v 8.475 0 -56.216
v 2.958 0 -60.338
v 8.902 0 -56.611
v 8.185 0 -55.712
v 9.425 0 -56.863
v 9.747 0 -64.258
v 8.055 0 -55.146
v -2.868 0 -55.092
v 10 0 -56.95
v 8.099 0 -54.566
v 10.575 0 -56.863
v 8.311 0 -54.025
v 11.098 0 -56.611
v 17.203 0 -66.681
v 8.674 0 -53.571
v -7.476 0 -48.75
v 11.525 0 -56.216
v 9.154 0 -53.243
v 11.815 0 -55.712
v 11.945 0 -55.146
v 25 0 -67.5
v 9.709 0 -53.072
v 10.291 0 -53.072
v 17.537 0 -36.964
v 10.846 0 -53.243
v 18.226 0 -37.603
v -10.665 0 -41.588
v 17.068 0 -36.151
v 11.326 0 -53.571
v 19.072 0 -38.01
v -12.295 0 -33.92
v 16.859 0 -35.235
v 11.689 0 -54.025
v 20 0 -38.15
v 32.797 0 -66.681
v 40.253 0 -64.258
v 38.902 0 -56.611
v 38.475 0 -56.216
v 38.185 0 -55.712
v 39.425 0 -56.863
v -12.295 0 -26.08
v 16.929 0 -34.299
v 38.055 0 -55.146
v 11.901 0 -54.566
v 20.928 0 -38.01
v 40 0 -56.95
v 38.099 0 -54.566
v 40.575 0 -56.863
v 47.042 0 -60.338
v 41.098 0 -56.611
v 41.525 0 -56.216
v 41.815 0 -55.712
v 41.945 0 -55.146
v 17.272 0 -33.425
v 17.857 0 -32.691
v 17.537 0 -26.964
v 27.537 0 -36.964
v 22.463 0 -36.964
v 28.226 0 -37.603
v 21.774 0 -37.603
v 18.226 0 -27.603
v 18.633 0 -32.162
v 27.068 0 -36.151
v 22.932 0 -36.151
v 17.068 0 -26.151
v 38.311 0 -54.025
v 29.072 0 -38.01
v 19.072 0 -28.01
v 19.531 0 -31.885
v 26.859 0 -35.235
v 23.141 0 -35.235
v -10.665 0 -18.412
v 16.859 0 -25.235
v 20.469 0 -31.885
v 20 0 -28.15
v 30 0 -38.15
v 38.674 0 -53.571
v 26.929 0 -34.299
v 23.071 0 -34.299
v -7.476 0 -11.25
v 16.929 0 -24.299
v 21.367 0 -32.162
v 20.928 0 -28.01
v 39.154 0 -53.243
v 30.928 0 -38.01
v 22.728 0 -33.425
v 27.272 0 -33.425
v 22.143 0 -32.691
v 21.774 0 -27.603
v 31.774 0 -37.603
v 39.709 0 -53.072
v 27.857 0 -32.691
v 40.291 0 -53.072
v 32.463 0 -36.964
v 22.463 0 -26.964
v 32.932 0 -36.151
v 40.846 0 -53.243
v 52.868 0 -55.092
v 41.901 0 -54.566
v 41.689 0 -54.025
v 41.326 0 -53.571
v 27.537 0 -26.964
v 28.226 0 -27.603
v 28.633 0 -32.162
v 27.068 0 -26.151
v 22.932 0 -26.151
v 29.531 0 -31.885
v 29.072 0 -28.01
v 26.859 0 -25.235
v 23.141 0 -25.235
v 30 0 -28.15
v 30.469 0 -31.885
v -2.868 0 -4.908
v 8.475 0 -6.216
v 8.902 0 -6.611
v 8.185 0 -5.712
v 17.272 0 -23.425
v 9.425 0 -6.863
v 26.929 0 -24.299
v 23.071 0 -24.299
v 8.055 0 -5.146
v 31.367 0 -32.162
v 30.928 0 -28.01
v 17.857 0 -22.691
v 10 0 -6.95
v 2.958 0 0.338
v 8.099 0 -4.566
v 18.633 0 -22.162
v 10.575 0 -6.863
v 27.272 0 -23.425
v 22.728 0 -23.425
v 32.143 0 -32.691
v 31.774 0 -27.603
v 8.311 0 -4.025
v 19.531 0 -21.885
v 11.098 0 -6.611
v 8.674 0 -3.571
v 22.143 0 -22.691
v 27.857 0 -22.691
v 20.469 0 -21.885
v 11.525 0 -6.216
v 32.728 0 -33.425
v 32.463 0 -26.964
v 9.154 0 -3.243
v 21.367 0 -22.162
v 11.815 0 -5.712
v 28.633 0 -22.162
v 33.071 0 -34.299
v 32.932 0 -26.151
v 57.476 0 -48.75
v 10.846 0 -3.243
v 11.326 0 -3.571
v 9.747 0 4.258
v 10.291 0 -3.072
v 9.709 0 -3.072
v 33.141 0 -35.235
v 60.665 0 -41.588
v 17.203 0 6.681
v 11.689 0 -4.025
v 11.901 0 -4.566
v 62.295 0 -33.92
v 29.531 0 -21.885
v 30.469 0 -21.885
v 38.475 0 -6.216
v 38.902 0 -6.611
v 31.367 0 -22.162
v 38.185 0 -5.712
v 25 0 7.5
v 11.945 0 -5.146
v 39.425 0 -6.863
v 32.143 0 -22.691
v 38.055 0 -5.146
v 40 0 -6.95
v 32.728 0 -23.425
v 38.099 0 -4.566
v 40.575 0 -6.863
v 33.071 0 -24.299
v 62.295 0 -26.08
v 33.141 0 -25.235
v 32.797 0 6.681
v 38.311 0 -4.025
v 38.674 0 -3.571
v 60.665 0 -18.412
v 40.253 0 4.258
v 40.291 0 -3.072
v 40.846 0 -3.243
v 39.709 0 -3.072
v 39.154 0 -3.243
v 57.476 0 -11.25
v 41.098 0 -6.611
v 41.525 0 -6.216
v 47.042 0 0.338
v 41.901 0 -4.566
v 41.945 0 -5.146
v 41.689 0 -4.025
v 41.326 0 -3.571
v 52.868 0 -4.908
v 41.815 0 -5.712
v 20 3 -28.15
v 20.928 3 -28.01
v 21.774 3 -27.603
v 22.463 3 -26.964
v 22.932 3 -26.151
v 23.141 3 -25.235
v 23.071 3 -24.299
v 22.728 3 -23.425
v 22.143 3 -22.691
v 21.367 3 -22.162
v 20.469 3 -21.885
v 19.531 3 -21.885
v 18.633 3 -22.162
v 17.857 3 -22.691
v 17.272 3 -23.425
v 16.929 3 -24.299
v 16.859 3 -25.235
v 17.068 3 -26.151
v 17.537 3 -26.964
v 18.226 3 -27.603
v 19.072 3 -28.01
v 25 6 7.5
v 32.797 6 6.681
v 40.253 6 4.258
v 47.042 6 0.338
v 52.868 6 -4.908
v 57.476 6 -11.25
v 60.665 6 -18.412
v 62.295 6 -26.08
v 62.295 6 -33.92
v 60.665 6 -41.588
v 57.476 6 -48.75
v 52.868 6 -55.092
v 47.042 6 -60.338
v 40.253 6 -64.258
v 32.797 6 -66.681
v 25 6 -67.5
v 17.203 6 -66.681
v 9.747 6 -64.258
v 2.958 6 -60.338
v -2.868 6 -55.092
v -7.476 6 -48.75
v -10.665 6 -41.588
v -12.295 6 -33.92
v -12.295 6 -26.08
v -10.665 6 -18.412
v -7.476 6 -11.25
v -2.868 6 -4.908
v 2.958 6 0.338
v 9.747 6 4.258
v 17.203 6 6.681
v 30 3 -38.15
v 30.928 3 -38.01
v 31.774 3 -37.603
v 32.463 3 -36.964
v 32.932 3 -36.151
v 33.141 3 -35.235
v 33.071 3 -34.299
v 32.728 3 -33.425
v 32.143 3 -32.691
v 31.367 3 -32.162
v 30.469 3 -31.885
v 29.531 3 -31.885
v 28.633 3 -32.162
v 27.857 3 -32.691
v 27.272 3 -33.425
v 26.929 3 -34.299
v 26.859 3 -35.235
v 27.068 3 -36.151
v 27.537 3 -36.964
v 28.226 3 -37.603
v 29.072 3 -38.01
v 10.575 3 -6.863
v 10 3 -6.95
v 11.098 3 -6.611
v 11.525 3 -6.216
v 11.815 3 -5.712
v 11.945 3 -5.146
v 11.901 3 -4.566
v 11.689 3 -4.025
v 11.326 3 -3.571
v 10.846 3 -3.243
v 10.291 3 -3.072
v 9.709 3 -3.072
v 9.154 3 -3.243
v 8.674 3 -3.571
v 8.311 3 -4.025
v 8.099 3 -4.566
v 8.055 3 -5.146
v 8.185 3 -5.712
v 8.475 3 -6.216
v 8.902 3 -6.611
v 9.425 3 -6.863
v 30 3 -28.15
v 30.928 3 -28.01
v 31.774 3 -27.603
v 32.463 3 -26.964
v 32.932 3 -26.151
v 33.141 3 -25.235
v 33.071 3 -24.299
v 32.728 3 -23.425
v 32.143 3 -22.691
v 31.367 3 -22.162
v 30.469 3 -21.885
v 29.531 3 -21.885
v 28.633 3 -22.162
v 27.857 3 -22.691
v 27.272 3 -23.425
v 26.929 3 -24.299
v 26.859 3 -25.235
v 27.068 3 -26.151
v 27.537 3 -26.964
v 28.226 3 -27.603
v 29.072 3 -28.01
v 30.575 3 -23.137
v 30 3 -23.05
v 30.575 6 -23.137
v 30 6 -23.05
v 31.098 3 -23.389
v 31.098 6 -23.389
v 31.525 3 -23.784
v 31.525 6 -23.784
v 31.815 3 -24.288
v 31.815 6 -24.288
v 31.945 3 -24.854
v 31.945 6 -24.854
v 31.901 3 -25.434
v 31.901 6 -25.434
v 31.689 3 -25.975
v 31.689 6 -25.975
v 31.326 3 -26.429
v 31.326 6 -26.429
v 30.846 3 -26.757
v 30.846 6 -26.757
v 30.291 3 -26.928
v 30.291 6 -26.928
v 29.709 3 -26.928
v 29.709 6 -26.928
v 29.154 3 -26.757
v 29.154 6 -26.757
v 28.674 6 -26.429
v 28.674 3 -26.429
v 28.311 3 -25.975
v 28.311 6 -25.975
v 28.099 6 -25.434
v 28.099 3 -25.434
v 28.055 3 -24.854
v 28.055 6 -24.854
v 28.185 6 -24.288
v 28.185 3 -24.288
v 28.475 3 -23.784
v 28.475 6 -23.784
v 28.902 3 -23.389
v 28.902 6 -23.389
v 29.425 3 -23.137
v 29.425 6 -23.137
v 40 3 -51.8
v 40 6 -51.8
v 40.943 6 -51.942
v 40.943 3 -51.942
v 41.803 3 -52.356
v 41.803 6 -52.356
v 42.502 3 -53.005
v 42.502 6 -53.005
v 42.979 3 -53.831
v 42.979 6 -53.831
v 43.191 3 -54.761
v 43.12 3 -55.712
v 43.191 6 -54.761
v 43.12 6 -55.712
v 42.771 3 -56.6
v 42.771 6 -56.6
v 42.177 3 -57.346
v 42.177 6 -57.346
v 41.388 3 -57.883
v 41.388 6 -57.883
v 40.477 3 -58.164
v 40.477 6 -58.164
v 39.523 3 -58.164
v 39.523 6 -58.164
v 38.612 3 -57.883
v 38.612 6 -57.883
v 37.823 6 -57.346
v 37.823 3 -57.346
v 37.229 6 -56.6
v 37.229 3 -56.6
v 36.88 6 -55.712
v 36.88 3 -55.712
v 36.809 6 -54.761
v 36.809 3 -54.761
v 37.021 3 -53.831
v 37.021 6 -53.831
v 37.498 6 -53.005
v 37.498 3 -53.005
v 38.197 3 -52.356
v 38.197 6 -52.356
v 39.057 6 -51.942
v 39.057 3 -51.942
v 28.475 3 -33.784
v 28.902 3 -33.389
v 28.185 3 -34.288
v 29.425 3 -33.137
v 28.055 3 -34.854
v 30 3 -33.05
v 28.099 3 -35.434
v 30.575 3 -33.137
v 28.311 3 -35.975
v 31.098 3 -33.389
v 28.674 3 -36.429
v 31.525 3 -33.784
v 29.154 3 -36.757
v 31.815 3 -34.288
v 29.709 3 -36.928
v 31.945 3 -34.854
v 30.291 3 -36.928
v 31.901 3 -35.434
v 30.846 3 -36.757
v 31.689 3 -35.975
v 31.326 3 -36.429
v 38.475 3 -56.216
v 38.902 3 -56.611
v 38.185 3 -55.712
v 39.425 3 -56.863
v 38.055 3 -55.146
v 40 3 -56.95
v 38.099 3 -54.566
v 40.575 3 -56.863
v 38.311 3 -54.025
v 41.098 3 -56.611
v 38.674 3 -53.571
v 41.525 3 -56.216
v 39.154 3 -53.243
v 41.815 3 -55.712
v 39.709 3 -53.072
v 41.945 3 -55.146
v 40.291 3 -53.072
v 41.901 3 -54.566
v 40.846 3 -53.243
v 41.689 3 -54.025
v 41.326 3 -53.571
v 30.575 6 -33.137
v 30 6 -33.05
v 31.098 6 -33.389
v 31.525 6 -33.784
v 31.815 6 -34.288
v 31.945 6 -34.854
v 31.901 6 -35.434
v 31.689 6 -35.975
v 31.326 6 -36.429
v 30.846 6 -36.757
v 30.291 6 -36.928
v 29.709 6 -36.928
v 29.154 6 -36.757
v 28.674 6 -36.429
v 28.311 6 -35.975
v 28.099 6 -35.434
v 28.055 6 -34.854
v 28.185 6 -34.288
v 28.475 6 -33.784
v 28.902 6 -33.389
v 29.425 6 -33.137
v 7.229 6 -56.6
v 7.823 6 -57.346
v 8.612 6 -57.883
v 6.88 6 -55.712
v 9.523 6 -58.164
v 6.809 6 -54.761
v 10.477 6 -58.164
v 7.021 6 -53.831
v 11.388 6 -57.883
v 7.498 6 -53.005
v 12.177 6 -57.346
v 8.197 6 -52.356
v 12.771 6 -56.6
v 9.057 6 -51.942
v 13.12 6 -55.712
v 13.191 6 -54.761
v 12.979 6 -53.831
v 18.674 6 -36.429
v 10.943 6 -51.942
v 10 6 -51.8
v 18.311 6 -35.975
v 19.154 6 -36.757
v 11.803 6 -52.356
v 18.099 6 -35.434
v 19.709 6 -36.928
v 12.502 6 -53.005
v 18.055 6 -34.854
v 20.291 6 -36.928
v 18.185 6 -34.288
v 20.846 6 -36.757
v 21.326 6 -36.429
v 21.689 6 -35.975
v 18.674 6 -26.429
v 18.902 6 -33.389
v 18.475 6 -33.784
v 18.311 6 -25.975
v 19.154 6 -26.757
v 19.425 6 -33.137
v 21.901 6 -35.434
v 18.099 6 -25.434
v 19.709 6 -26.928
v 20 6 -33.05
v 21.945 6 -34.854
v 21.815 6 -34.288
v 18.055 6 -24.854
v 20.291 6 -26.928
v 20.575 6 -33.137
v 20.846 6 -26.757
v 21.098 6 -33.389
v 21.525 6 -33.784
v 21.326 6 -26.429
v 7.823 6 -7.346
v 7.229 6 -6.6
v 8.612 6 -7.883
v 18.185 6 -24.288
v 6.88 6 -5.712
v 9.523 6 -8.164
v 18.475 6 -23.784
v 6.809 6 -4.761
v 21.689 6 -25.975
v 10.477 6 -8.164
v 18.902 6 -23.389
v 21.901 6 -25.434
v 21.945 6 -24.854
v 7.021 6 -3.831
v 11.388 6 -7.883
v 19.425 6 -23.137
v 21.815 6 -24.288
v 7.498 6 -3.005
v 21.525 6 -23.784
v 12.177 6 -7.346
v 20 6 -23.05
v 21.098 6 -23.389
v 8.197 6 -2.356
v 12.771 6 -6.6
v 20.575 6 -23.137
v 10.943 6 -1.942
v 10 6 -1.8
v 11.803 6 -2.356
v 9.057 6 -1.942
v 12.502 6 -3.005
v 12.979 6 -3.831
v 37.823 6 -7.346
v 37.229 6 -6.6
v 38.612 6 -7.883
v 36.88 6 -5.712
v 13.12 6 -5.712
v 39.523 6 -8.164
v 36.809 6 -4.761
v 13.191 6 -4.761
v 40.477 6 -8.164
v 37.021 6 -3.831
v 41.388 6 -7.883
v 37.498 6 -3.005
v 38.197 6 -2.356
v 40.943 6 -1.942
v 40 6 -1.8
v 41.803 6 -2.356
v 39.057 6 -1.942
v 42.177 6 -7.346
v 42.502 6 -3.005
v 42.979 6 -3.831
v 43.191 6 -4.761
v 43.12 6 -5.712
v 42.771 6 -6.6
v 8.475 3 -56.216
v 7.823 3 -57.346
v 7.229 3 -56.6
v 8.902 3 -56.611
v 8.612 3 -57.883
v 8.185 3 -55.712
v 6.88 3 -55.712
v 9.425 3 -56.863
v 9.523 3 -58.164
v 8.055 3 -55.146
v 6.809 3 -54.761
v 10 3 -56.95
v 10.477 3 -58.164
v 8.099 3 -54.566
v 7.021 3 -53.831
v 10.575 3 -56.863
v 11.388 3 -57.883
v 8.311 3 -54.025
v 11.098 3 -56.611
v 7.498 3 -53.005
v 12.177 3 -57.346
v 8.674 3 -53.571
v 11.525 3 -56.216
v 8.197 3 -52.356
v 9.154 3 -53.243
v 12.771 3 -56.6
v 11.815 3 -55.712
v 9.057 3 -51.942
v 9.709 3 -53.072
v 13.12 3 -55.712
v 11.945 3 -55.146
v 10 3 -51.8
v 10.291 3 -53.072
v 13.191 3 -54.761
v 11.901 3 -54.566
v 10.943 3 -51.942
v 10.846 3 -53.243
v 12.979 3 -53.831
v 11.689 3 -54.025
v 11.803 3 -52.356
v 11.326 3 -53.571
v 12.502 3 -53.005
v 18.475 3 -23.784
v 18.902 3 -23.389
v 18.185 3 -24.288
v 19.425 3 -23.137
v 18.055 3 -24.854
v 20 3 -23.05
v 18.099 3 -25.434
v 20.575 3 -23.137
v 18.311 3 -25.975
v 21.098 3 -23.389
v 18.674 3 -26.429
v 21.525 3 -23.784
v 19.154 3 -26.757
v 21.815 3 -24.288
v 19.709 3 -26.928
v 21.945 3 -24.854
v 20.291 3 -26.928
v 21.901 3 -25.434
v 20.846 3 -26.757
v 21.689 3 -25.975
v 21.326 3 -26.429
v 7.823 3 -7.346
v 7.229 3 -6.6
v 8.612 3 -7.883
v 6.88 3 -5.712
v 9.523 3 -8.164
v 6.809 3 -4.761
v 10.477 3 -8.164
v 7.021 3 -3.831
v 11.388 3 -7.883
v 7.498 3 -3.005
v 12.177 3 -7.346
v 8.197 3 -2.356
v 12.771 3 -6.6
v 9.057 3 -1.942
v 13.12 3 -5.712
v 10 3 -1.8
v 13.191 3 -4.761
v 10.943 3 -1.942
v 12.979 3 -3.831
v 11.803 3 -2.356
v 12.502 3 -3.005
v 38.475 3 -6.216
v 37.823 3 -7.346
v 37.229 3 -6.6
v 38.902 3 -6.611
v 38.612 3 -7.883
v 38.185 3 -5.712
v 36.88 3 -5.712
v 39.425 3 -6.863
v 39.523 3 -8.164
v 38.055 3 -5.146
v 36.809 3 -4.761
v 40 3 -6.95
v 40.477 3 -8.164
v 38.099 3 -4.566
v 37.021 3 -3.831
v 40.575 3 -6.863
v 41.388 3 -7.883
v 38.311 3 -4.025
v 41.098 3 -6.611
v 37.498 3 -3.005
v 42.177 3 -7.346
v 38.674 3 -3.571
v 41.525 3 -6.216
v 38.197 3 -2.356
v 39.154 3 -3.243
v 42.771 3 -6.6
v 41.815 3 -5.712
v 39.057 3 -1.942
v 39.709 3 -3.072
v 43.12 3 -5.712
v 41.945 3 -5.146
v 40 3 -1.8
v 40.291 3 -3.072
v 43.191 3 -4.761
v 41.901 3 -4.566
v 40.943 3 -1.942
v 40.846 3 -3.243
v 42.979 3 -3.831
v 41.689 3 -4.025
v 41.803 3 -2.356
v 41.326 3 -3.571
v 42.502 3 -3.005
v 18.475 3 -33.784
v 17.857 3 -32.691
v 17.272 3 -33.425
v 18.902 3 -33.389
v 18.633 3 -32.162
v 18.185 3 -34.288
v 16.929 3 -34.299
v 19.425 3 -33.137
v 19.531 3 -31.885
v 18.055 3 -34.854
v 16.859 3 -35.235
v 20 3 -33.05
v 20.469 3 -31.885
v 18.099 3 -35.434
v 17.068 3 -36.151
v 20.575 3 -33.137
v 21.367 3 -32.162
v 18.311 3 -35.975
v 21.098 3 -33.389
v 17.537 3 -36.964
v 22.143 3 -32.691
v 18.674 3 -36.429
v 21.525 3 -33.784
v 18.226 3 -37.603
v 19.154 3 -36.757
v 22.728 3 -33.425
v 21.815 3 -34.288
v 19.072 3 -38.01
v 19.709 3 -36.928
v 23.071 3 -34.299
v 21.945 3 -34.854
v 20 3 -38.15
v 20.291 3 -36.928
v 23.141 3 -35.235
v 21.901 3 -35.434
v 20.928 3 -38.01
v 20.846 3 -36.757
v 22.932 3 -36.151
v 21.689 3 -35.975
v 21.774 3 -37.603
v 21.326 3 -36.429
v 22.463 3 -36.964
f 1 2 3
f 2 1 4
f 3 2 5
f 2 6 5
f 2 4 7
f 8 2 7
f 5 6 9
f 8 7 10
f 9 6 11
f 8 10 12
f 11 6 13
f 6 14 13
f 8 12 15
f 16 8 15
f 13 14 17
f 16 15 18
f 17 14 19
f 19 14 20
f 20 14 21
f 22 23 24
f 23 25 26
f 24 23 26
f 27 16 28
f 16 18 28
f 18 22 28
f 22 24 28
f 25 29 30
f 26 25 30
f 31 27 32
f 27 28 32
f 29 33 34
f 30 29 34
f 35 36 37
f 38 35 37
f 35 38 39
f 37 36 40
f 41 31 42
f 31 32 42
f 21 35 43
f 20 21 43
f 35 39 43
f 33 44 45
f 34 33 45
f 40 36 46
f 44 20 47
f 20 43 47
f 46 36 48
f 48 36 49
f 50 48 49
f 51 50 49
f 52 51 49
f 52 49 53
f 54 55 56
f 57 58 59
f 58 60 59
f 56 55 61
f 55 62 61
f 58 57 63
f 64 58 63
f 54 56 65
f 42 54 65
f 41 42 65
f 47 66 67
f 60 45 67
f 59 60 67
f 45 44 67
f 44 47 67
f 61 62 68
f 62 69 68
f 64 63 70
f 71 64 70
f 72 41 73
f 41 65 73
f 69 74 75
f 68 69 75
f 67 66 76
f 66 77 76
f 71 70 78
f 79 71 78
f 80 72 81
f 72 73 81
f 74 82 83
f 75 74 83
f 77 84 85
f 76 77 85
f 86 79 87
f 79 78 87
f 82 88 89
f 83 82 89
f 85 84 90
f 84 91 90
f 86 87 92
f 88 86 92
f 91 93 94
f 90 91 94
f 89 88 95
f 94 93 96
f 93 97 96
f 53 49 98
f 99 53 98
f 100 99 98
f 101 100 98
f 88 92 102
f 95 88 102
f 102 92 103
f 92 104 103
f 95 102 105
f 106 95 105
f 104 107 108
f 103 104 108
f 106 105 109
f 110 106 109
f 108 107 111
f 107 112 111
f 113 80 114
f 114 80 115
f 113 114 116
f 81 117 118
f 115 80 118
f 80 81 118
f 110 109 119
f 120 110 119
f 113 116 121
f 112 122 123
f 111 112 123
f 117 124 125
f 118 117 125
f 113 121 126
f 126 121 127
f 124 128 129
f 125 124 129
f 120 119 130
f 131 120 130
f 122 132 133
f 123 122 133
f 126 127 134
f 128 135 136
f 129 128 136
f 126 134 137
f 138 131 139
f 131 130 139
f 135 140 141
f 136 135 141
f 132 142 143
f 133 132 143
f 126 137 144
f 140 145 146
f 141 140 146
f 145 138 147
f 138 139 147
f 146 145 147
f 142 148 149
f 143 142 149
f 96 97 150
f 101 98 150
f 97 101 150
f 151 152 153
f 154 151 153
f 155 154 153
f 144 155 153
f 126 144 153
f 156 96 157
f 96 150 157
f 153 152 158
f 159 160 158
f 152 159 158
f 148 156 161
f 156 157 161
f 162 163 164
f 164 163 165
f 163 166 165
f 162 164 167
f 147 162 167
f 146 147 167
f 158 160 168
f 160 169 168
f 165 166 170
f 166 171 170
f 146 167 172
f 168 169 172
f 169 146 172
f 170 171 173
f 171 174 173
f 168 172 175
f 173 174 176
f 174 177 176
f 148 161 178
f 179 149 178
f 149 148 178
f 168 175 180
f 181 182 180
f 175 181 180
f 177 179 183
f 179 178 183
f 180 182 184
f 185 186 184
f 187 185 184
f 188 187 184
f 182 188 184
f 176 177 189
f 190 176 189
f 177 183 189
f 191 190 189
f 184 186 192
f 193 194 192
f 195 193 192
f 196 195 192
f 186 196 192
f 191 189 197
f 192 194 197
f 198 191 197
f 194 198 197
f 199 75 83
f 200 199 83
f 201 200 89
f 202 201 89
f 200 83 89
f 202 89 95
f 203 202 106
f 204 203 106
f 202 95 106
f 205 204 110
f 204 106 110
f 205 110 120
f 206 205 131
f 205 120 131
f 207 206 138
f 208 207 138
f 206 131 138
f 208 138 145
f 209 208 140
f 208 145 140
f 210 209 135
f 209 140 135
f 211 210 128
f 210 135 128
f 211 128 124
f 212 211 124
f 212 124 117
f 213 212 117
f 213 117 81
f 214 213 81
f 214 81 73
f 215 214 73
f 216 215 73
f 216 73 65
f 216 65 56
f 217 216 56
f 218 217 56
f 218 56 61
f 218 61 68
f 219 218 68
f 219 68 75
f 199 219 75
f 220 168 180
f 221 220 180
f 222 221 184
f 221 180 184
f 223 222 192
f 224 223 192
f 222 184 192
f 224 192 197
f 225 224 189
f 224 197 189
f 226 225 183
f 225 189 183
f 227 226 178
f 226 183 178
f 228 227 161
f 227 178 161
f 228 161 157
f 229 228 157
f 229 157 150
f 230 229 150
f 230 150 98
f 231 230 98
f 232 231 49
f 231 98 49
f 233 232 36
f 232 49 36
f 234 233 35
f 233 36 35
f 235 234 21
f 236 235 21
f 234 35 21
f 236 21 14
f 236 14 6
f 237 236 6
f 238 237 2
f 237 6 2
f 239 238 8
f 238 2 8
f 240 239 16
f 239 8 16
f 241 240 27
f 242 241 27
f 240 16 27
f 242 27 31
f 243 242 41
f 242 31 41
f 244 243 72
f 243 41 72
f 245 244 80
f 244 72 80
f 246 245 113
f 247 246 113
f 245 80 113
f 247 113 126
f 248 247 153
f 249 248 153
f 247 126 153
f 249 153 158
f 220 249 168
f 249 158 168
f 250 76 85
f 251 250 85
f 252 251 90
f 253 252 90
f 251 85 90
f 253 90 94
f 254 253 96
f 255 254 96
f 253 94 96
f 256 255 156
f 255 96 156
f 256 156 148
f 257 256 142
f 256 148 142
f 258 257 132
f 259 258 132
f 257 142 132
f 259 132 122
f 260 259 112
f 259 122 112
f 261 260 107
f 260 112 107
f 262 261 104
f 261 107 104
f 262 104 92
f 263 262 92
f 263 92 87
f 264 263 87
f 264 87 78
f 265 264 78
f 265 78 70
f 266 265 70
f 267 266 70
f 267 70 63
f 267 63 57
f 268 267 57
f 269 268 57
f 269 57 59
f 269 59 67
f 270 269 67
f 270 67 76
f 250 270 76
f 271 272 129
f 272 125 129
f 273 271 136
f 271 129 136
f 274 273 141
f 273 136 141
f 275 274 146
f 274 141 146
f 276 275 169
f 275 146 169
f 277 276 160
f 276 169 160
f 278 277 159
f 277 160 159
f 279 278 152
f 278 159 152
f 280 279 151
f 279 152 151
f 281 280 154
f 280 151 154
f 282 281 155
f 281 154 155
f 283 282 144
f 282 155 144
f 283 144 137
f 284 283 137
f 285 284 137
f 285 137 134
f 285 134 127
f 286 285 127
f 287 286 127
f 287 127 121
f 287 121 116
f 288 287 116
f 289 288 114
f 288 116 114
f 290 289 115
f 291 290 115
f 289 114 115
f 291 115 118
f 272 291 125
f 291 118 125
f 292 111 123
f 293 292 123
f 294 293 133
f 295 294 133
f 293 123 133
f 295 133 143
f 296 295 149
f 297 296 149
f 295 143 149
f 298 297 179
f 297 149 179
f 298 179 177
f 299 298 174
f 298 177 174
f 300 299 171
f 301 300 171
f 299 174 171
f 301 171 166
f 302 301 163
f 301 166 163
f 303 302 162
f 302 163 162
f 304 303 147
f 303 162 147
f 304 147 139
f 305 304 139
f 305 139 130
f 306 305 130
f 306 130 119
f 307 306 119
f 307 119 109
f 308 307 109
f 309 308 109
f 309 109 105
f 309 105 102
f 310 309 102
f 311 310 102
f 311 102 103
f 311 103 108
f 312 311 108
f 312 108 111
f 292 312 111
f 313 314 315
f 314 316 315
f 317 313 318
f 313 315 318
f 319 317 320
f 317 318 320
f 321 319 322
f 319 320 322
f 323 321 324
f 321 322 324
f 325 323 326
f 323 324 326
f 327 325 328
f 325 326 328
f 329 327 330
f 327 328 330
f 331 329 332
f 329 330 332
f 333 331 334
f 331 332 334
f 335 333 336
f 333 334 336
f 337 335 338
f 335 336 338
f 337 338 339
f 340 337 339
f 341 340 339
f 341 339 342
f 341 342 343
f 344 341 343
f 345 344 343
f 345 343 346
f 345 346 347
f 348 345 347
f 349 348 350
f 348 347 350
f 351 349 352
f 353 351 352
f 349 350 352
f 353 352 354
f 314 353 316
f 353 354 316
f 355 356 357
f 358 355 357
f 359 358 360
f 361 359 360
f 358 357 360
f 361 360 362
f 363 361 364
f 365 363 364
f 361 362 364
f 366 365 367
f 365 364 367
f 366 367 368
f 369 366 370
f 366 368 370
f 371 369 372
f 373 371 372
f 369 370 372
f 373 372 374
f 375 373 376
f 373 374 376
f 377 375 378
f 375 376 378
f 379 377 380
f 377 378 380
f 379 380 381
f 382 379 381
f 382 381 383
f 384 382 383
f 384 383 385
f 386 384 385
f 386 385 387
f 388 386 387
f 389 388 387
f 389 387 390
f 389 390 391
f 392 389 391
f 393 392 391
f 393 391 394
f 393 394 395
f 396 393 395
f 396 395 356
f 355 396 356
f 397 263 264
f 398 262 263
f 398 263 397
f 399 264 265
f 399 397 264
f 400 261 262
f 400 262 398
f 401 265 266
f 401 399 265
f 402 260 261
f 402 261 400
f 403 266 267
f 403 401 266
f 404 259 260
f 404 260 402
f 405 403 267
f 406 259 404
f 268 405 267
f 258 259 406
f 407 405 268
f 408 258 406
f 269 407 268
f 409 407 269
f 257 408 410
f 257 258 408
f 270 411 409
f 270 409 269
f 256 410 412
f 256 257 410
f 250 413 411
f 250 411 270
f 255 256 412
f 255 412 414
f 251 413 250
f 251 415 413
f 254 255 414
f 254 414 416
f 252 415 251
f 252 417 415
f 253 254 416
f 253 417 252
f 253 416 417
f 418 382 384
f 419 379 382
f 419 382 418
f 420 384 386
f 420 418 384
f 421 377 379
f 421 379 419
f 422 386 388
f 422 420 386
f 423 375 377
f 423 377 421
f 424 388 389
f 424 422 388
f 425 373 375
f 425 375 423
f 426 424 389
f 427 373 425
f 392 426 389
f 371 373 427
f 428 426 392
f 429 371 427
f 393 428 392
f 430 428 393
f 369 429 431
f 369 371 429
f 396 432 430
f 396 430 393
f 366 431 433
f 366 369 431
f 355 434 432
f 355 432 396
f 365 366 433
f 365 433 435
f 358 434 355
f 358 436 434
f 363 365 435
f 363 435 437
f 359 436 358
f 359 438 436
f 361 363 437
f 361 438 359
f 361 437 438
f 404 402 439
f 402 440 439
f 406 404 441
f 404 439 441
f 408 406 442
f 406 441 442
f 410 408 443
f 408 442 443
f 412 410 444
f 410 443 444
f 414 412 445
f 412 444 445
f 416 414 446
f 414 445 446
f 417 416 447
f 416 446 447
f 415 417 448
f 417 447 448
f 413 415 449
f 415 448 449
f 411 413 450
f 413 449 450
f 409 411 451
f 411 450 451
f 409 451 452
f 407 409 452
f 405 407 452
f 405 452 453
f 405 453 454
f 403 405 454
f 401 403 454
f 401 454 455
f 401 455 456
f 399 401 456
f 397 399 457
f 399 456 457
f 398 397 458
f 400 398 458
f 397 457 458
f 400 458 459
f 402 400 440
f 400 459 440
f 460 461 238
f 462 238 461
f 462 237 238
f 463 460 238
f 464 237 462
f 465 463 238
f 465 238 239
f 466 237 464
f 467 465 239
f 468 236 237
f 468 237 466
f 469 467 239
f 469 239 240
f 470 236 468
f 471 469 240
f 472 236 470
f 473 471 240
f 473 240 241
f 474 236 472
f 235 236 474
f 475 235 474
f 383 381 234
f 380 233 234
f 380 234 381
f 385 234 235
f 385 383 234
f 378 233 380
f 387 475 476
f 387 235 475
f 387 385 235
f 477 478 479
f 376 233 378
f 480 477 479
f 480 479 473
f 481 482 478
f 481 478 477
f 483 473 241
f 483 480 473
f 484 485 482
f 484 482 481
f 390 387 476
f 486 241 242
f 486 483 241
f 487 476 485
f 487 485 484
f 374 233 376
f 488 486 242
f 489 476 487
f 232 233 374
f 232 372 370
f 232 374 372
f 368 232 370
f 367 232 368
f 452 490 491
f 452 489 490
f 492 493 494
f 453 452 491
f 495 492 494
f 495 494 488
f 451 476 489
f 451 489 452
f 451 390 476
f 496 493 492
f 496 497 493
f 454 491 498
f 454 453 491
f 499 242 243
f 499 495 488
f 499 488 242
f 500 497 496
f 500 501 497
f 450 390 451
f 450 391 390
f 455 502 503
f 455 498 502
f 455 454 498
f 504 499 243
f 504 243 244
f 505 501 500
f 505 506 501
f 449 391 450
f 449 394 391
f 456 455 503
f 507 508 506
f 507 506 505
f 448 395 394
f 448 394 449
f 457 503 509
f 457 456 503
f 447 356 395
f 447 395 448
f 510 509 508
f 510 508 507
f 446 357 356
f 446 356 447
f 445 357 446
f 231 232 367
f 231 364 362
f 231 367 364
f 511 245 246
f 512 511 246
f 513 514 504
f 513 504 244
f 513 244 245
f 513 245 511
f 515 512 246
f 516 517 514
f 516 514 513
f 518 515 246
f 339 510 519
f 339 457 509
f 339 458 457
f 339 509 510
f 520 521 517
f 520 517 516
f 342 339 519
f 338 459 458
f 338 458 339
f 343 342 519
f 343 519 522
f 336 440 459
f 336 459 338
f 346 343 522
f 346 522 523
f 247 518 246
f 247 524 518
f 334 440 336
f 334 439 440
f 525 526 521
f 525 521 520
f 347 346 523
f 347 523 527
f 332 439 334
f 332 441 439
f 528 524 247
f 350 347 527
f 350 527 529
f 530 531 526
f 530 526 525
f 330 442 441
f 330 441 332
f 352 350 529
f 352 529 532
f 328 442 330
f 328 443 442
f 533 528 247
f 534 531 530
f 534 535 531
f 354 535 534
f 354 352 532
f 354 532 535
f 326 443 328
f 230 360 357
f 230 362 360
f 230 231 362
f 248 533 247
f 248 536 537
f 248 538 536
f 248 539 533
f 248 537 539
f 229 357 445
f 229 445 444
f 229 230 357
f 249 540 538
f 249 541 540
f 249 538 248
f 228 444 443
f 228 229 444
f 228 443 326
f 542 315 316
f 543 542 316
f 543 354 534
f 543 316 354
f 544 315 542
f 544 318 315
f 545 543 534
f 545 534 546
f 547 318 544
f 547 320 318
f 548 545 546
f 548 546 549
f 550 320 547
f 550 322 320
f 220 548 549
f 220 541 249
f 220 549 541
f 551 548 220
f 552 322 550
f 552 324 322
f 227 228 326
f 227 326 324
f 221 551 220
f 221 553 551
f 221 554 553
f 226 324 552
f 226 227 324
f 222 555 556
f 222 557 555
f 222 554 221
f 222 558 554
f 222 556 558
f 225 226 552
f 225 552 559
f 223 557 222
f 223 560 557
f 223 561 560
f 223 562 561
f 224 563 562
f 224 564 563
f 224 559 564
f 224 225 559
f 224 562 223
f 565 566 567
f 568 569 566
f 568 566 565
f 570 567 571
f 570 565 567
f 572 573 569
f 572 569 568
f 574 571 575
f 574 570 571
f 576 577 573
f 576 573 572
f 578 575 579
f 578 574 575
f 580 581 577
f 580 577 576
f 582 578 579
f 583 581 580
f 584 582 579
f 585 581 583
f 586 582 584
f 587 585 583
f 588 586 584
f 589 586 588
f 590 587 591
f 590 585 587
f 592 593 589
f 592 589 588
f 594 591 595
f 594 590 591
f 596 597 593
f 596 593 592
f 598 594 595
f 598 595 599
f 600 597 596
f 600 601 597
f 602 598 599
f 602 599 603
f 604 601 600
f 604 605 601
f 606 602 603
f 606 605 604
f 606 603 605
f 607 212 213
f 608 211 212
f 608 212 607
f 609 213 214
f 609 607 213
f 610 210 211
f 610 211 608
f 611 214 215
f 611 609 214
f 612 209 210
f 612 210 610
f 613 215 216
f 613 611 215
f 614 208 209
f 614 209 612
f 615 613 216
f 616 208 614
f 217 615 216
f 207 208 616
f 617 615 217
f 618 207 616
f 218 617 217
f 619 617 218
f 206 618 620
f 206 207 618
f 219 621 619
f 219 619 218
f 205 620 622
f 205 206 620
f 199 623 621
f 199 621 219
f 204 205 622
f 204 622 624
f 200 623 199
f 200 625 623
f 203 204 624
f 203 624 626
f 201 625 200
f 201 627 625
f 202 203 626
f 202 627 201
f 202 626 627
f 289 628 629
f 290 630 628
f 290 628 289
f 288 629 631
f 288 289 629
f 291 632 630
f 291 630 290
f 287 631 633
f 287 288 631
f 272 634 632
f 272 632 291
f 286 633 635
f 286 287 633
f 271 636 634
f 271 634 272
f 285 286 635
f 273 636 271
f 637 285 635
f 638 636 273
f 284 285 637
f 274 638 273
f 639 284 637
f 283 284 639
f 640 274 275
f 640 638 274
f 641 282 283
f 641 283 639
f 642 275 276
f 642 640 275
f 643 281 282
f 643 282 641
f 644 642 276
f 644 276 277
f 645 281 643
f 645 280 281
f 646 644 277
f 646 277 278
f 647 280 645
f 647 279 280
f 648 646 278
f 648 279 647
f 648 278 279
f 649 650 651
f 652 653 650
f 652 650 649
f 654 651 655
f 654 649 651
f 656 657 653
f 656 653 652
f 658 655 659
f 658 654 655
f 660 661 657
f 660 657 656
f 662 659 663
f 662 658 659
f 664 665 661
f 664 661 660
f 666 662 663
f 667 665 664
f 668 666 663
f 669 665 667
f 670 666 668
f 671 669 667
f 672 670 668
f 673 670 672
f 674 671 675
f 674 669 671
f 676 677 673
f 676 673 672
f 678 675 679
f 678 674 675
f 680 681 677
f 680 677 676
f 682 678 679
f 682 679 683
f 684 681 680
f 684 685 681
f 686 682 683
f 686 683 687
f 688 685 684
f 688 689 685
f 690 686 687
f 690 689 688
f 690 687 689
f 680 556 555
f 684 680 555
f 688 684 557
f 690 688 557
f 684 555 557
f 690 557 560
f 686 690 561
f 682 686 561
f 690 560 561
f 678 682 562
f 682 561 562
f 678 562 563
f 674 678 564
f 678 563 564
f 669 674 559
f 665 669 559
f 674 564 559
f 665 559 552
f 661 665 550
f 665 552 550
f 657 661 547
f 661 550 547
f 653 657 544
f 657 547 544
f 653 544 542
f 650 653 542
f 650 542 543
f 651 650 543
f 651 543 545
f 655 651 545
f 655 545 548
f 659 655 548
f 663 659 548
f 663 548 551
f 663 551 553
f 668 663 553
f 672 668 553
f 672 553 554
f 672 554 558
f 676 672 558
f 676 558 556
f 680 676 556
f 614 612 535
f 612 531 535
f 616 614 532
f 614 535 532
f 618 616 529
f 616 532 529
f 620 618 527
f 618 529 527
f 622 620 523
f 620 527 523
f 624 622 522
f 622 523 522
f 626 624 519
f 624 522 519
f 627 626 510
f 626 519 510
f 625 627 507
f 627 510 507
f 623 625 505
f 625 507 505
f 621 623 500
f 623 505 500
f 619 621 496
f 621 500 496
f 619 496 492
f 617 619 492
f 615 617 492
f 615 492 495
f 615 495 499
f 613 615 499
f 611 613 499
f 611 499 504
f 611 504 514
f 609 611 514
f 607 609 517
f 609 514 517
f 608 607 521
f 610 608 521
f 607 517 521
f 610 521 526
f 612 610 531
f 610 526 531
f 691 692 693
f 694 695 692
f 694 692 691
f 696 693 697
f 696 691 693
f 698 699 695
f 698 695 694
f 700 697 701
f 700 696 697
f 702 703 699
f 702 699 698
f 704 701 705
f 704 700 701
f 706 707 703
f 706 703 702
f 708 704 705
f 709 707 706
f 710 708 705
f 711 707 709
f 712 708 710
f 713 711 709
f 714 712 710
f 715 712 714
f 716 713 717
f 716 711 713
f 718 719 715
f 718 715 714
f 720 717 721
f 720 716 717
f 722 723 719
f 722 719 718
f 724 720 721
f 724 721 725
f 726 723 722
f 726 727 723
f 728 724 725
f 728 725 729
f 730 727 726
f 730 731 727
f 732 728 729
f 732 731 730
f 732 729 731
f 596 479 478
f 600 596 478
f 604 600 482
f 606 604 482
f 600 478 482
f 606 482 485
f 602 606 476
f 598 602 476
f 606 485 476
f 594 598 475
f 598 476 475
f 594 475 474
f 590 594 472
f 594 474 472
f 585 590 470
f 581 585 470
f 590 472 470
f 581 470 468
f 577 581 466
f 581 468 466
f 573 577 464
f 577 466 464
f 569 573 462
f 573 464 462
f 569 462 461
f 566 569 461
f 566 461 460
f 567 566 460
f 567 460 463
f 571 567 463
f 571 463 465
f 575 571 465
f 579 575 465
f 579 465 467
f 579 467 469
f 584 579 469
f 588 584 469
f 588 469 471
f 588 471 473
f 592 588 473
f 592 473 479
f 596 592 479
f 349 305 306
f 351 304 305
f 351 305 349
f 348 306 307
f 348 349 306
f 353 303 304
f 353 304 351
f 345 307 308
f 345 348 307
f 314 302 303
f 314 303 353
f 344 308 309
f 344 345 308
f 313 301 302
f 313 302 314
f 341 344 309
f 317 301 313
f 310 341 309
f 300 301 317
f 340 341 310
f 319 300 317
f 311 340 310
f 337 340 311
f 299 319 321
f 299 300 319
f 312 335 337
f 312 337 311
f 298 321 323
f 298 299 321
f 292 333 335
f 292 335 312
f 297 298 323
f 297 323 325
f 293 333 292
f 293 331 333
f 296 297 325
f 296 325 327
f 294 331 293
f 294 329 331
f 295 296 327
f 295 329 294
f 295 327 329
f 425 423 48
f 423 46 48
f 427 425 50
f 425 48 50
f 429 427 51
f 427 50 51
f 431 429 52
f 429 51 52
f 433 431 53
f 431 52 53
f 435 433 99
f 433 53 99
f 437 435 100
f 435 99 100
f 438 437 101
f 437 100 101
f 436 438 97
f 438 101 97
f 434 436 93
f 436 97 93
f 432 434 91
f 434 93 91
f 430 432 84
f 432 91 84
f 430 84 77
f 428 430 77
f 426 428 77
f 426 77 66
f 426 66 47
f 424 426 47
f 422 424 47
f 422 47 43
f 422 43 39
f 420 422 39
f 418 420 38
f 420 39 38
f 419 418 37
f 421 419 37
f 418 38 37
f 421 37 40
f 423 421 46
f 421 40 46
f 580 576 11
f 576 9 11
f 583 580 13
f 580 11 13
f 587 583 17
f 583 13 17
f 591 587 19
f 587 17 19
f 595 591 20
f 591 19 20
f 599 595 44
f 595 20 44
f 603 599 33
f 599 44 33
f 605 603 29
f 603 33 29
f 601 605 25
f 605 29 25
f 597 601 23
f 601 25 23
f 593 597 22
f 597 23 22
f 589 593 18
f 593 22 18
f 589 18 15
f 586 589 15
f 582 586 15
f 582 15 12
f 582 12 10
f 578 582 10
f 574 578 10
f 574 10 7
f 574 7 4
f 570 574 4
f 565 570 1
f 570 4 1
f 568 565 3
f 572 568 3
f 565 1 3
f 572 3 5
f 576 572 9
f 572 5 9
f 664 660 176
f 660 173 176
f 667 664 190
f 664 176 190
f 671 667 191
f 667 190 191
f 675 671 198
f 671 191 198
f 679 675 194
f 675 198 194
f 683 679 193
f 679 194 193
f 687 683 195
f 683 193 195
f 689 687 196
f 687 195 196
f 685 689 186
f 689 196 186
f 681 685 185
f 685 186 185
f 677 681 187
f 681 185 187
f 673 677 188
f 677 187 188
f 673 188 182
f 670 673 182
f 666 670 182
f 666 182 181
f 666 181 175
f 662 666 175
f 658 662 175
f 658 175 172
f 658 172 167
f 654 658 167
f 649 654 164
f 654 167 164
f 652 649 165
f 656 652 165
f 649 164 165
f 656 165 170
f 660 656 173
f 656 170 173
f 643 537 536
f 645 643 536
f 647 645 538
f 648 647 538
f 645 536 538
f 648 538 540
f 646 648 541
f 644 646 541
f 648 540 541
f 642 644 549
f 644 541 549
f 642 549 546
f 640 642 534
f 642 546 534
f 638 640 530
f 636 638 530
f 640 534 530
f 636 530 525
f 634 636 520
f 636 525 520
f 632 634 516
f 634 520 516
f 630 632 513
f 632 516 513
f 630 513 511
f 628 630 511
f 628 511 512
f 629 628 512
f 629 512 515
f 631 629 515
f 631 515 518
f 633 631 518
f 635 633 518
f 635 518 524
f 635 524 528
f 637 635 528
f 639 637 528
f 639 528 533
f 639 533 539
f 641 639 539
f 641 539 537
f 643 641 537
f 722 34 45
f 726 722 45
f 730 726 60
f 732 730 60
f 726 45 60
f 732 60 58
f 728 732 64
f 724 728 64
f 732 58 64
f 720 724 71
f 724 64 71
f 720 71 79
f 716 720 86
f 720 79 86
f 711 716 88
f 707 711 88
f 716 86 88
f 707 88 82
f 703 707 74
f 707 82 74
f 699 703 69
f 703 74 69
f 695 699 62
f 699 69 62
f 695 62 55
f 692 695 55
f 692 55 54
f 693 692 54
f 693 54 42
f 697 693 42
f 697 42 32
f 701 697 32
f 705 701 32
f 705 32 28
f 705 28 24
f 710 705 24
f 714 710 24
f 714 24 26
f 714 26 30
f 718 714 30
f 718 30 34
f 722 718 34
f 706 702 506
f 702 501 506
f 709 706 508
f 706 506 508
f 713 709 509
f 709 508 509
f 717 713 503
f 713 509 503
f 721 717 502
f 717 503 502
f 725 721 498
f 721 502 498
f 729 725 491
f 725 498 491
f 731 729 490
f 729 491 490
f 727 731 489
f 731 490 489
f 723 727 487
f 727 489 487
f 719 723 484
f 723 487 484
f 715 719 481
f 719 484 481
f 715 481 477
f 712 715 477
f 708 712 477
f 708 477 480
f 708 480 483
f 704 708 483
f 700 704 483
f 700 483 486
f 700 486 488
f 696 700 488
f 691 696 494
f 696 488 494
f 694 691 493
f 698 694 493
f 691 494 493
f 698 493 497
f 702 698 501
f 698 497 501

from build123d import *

# Parameters (mm, degrees)
SKIZZE1_R                       = 37.5
AUFSATZ_LINEAR_AUSTRAGEN1_DEPTH = 6
BOHRUNG3_D                      = 3.9
BOHRUNG3_CBORE_D                = 6.3
BOHRUNG3_CBORE_DEPTH            = 3
BOHRUNG4_D                      = 3.9
BOHRUNG4_CBORE_D                = 6.4
BOHRUNG4_CBORE_DEPTH            = 3


with BuildPart() as part:
    # Skizze1 → Aufsatz-Linear austragen1 (new body)
    with BuildSketch(Plane(origin=(0, 0, 0), x_dir=(1, 0, 0), z_dir=(0, 1, 0))):
        with Locations(Location((25, 30, 0), (0, 0, 270))):
            Circle(SKIZZE1_R)
    extrude(amount=AUFSATZ_LINEAR_AUSTRAGEN1_DEPTH)

    # Bohrung3 (through all)
    with Locations(Plane(origin=(20, 0, -25), x_dir=(0, 0, -1), z_dir=(0, -1, 0))):
        with Locations((0, 0), (0, 10), (10, 10), (10, 0)):
            CounterBoreHole(BOHRUNG3_D / 2, BOHRUNG3_CBORE_D / 2, BOHRUNG3_CBORE_DEPTH)

    # Bohrung4 (through all)
    with Locations(Plane(origin=(10, 6, -55), x_dir=(0, 0, 1), z_dir=(0, 1, 0))):
        with Locations((0, 0), (50, 30), (50, 0), (0, 30)):
            CounterBoreHole(BOHRUNG4_D / 2, BOHRUNG4_CBORE_D / 2, BOHRUNG4_CBORE_DEPTH)


solid = part.part
